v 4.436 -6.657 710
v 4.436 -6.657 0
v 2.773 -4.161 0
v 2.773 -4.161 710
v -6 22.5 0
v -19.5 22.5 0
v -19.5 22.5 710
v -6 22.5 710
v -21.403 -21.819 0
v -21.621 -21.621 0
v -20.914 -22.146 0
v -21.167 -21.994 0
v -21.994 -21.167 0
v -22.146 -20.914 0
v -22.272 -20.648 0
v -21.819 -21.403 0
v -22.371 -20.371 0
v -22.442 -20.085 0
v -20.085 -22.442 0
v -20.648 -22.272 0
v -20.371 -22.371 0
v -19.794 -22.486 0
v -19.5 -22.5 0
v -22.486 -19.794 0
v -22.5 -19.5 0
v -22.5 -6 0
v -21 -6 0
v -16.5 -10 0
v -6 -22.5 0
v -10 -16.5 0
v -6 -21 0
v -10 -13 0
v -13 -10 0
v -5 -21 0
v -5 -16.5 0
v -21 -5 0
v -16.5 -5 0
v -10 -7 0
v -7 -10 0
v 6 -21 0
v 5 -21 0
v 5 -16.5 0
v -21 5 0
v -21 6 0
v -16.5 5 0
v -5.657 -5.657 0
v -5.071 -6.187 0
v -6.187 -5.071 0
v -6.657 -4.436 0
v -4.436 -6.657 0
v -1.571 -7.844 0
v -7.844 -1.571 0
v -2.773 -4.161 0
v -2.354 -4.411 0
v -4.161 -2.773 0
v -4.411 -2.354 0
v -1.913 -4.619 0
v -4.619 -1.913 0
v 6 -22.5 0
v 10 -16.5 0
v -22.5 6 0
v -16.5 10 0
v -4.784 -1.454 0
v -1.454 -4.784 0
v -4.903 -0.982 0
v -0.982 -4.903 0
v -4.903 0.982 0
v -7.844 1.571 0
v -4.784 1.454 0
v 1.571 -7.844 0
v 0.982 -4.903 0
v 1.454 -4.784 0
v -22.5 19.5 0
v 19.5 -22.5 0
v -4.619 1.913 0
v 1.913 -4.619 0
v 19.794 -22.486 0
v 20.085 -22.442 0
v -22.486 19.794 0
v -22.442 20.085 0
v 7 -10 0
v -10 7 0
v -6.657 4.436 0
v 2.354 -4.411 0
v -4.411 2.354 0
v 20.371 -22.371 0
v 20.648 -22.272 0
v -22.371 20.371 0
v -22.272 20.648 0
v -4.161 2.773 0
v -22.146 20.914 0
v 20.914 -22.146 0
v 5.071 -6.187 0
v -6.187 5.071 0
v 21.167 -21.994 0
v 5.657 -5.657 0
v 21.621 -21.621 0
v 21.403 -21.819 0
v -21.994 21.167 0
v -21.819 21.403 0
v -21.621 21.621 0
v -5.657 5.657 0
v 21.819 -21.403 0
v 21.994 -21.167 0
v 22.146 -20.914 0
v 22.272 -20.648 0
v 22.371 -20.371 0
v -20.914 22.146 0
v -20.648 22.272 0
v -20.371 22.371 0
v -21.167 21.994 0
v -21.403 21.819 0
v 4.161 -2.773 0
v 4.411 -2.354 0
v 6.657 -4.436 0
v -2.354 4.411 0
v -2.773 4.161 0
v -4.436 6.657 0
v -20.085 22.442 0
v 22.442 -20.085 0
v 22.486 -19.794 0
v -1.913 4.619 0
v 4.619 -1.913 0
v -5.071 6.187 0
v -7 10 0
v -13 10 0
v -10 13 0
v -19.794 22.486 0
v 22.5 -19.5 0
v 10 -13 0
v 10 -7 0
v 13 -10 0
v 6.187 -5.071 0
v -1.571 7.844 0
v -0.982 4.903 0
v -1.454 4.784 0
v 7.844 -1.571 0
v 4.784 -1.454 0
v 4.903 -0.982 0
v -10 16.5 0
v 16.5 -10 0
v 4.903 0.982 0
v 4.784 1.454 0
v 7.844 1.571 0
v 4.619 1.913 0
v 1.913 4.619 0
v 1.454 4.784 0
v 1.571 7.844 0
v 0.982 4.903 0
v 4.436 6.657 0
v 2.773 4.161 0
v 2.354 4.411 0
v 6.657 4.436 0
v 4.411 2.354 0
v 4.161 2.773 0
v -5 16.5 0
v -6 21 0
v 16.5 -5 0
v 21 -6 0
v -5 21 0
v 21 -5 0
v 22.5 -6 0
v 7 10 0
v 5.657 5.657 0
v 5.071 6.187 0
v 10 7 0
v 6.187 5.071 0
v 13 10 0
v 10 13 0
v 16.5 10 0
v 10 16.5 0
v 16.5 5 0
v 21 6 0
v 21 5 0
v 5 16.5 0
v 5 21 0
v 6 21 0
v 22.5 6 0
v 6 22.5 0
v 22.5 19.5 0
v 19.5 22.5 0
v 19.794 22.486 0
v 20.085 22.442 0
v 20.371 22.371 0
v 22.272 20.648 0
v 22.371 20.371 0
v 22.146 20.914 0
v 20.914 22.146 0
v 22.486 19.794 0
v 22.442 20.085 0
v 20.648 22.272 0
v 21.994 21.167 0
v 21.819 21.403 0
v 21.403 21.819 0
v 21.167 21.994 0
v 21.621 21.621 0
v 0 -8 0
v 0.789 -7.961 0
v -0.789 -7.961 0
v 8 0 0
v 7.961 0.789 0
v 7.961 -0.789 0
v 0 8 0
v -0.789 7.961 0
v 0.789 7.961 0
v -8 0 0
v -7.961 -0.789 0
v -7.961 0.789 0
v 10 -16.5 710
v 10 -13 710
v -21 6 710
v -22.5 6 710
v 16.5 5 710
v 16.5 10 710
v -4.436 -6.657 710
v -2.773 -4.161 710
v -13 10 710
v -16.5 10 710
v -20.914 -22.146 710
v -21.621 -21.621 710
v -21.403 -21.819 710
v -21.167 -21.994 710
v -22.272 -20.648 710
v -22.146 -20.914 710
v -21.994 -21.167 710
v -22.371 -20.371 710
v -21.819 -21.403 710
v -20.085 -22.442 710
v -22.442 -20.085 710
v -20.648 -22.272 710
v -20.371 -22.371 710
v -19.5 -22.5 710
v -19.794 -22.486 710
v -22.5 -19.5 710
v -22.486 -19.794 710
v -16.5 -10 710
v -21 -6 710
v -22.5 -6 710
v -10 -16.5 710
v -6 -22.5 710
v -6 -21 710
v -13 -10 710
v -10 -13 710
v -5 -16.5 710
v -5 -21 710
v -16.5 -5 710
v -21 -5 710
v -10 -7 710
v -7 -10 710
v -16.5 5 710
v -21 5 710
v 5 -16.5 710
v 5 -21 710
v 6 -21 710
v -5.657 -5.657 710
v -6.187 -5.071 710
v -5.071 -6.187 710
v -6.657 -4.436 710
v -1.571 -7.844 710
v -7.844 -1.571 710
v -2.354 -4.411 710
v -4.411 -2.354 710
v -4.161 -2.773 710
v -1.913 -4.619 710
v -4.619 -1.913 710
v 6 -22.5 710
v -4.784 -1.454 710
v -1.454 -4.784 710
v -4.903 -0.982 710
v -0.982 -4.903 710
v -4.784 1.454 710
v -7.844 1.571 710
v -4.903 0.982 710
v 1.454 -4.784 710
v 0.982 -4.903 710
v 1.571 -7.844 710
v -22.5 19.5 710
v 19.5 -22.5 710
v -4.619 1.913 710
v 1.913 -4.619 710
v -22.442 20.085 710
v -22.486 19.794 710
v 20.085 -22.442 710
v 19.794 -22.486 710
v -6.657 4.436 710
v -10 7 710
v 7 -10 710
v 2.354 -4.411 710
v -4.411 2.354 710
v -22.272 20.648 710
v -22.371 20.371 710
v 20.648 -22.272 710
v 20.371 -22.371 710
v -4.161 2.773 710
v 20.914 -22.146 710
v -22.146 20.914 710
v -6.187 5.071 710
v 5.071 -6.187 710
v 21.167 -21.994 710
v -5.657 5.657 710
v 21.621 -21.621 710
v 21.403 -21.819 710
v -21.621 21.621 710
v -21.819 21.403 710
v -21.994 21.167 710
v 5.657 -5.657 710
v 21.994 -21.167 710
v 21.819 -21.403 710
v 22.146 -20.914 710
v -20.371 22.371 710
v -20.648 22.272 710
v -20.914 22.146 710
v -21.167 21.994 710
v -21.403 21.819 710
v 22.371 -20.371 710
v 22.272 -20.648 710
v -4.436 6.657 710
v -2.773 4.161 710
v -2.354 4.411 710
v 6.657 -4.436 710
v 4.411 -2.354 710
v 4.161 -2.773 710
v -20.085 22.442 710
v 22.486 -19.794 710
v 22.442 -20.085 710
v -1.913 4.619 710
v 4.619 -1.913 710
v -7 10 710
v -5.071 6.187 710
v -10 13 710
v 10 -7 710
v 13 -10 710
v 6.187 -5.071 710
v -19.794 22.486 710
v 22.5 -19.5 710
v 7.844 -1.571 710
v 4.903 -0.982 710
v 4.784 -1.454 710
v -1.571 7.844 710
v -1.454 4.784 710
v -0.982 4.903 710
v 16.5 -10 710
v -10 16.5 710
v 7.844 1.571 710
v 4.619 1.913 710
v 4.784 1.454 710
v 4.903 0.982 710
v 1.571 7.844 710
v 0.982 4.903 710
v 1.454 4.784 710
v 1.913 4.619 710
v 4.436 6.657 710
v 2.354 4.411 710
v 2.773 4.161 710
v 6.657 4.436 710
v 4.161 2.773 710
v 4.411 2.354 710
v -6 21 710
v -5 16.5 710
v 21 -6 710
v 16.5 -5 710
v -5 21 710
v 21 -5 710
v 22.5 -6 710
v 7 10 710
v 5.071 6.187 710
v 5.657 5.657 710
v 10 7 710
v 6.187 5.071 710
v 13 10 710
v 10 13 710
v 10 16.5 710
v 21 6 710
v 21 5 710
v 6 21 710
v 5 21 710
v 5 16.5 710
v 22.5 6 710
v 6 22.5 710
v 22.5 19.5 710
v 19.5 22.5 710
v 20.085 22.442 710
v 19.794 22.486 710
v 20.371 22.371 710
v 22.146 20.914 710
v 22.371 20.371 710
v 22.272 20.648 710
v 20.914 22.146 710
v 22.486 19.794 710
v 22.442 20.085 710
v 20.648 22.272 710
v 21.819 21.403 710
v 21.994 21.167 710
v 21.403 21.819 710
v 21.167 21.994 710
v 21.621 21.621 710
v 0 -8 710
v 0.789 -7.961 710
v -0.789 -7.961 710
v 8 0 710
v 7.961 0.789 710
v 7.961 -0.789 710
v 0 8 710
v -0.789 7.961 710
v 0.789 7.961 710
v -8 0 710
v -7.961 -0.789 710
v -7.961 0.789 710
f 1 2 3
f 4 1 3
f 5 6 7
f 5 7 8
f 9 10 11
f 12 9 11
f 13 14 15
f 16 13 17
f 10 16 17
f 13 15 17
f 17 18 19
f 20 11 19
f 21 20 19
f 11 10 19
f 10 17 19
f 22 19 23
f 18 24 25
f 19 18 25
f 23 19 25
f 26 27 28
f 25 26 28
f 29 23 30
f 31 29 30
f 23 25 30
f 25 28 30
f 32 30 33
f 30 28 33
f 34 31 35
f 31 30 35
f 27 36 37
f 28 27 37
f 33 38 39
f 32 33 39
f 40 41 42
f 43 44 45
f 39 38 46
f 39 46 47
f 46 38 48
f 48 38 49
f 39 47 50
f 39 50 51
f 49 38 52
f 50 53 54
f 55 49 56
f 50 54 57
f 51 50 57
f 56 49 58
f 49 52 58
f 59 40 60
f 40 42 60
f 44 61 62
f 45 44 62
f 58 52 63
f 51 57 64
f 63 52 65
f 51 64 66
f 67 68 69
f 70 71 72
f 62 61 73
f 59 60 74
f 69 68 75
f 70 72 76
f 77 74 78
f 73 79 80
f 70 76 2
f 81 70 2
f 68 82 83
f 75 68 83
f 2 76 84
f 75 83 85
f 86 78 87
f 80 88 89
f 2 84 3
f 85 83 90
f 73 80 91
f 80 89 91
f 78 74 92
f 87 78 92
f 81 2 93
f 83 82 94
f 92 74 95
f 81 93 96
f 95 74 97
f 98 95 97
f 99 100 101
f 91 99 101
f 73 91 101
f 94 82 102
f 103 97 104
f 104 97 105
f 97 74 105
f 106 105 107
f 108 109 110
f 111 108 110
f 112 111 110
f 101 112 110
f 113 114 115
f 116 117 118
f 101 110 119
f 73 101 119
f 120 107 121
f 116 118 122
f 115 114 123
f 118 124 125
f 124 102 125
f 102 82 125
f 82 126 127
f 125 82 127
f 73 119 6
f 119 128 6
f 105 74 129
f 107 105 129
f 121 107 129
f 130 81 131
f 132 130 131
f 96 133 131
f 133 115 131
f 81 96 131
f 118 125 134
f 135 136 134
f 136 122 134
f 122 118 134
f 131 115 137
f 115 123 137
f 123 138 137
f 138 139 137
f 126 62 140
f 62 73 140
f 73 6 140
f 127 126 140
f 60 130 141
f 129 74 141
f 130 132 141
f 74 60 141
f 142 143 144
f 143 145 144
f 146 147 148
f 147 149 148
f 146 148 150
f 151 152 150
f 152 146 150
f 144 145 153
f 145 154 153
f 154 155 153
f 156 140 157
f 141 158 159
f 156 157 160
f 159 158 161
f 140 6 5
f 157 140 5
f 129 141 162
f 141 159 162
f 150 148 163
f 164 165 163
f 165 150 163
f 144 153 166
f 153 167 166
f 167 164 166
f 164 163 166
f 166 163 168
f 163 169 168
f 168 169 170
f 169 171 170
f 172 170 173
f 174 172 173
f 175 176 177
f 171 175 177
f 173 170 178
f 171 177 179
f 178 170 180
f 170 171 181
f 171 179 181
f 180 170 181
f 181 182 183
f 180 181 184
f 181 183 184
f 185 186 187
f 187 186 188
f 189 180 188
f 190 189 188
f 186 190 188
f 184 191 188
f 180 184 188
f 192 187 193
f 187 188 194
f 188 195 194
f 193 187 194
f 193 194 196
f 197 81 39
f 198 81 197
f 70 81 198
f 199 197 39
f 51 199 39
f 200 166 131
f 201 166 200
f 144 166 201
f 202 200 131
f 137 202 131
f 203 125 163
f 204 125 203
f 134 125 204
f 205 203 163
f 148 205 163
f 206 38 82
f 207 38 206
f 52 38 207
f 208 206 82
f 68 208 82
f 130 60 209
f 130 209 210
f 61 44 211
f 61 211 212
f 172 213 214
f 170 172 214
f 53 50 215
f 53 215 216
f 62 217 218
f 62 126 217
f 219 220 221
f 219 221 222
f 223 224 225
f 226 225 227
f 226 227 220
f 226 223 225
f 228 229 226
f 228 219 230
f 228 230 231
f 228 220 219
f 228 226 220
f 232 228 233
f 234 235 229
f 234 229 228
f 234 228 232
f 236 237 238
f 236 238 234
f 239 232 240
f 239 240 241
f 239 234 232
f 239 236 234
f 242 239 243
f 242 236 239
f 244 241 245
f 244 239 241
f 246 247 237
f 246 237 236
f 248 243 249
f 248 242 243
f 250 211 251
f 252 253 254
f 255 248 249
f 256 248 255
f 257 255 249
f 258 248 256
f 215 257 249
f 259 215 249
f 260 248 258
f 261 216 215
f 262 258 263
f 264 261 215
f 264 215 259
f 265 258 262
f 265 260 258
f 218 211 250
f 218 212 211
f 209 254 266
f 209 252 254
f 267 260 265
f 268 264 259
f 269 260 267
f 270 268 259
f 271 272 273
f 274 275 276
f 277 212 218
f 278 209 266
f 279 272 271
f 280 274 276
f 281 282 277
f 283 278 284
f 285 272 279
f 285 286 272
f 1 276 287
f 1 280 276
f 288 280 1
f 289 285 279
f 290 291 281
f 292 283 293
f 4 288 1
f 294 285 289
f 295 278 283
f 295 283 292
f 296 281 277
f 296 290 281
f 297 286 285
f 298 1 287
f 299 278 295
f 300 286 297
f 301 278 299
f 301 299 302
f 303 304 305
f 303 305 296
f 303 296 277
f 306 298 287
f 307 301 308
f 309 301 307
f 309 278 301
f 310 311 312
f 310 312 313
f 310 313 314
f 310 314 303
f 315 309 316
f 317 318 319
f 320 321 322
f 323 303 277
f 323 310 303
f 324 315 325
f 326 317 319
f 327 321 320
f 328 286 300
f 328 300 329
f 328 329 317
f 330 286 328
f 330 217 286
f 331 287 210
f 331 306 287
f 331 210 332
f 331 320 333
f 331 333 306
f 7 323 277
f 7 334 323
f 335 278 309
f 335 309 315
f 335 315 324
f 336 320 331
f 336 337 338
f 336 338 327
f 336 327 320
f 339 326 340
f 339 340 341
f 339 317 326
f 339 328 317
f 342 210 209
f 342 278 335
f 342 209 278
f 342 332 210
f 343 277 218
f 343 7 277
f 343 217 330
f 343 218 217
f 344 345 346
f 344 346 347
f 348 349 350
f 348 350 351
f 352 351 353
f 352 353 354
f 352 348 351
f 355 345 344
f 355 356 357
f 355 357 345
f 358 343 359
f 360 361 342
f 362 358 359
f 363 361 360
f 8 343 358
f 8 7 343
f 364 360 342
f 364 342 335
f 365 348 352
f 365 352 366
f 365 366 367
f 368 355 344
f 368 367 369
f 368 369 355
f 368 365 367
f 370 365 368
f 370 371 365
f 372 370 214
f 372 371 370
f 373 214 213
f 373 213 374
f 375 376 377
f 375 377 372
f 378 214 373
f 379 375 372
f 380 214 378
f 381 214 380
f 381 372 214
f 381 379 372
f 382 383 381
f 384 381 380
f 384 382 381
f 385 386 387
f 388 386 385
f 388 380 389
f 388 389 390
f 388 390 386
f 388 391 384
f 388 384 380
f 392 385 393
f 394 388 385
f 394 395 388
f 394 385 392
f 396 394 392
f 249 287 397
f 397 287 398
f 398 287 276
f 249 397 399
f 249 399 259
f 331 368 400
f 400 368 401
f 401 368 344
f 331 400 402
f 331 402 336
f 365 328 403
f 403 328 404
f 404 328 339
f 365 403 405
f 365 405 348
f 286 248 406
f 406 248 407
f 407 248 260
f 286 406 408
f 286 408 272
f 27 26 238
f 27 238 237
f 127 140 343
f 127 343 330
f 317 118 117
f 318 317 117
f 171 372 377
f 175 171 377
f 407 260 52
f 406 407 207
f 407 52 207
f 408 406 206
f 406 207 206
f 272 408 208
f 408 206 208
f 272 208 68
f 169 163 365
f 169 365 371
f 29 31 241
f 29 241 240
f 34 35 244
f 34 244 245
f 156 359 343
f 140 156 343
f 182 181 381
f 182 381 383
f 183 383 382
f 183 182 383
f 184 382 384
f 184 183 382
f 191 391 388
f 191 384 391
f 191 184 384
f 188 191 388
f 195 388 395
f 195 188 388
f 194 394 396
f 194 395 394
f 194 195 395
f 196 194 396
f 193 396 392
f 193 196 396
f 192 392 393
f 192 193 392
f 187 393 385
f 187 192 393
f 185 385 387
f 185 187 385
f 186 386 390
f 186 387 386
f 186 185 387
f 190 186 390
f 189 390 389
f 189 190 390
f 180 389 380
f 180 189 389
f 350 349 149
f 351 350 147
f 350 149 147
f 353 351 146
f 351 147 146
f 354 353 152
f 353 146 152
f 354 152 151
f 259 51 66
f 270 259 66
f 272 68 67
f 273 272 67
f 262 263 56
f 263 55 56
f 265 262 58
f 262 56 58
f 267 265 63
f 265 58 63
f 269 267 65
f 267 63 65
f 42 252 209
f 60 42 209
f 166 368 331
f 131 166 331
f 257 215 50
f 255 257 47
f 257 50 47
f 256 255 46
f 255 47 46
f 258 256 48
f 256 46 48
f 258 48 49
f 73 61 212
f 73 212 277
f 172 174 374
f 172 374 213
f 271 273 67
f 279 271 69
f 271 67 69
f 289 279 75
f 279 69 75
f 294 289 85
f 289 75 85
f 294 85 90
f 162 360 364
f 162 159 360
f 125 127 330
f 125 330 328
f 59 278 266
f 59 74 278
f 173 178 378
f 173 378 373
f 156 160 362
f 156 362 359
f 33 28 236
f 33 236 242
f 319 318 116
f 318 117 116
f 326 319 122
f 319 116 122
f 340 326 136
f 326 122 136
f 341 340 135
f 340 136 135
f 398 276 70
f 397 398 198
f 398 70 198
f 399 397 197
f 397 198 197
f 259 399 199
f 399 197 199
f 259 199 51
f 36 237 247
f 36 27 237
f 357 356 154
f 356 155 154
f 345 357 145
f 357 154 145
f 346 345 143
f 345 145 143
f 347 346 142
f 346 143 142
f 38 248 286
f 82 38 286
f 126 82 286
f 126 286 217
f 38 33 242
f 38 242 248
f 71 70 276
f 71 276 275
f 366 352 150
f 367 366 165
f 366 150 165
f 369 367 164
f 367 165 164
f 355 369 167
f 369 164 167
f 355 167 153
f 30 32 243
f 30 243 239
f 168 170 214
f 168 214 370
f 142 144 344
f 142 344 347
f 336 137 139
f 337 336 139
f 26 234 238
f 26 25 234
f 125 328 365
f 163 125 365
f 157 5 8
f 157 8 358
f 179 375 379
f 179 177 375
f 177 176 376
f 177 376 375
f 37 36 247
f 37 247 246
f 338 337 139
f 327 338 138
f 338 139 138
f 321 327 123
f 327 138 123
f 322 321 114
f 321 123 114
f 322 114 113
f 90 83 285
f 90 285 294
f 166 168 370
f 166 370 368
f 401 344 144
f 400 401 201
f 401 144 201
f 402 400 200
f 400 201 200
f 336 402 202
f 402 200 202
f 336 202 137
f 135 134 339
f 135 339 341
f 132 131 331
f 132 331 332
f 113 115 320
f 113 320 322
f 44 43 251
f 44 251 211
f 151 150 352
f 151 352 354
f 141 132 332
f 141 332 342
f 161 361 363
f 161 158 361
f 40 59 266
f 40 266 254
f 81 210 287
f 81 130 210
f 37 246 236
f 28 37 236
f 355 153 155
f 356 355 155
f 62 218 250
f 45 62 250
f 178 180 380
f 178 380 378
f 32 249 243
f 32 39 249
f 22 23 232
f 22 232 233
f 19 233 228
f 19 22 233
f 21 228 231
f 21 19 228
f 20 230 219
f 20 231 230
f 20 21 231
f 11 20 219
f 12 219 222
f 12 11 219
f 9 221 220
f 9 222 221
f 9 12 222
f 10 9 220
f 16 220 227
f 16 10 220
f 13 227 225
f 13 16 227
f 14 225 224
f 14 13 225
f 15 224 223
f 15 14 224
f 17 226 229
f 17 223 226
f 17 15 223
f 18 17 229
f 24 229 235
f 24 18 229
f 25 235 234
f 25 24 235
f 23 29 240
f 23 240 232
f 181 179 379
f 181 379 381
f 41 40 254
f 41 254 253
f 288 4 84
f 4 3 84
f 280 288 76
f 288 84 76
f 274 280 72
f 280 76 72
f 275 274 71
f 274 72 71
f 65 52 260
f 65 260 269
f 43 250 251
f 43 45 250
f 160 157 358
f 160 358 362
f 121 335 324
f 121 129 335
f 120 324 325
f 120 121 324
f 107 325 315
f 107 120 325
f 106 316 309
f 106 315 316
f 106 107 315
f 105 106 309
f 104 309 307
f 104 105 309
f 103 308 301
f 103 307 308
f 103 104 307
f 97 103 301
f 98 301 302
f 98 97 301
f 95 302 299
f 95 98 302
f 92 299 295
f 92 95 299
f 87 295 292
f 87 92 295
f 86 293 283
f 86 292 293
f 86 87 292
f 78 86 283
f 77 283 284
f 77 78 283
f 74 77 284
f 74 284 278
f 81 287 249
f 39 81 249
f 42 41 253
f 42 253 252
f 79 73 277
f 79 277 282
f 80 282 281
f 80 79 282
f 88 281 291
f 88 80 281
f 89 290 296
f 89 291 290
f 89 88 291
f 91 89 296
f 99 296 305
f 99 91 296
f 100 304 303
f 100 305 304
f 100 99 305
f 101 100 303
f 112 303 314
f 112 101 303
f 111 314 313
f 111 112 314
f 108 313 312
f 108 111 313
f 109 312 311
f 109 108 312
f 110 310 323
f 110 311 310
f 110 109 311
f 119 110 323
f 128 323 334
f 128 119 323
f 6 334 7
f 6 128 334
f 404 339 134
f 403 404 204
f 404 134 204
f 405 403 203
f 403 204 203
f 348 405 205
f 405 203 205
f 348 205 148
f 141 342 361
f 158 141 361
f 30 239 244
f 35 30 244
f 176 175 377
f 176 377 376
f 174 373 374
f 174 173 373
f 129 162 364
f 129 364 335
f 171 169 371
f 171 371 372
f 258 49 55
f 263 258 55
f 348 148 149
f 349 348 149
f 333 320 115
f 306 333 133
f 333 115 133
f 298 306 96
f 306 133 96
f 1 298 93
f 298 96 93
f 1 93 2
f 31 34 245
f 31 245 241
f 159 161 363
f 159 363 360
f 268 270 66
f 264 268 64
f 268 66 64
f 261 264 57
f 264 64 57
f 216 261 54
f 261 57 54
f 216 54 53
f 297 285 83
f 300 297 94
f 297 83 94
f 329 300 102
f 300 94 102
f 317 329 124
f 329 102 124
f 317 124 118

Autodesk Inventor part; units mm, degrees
ref_plane "YZ Plane" through (0, 0, 0) normal (1, 0, 0) x (0, 1, 0)
ref_plane "XZ Plane" through (0, 0, 0) normal (0, 1, 0) x (-1, 0, 0)
ref_plane "XY Plane" through (0, 0, 0) normal (0, 0, 1) x (1, 0, 0)
sketch "Skizze1" plane through (0, 0, 0) normal (0, 0, 1) x (1, 0, 0)
  line L0 (-19.5, 22.5) -> (19.5, 22.5)
  line L1 (22.5, 19.5) -> (22.5, -19.5)
  line L2 (19.5, -22.5) -> (-19.5, -22.5)
  line L3 (-22.5, -19.5) -> (-22.5, 19.5)
  circle A0 centre (0, 0) radius 5
  line L4 (-32.3698, 0) -> (32.3698, 0) projected
  line L5 (0, -32.3698) -> (0, 32.3698) projected
  arc A1 (22.5, 19.5) -> (19.5, 22.5) centre (19.5, 19.5) ccw
  arc A2 (-19.5, 22.5) -> (-22.5, 19.5) centre (-19.5, 19.5) ccw
  arc A3 (-22.5, -19.5) -> (-19.5, -22.5) centre (-19.5, -19.5) ccw
  arc A4 (19.5, -22.5) -> (22.5, -19.5) centre (19.5, -19.5) ccw
  point P0 (-22.5, 22.5)
  point P1 (22.5, 22.5)
  point P2 (-22.5, -22.5)
  dimension "d0" = 45
  dimension "d1" = 45
  dimension "d2" = 10
  dimension "d3" = 3
extrude "Extrusion1" add sketch "Skizze1" along normal blind 710 contours L0 L5 A0 L4 L3 A2 | L0 A1 L1 L4 A0 L5 | L4 A0 L5 L2 A3 L3 | L4 L1 A4 L2 L5 A0
sketch "Skizze2" plane through (0, 0, 0) normal (0, 0, -1) x (-1, 0, 0)
  line L0 (19.5, -22.5) -> (-19.5, -22.5) projected
  line L1 (31.5, 0) -> (-31.5, 0) projected
  line L2 (0, -31.5) -> (0, 31.5) projected
  line L3 (-6, -22.5) -> (-6, -21)
  line L4 (-6, -21) -> (-5, -21)
  line L5 (-5, -21) -> (-5, -16.5)
  line L6 (-5, -16.5) -> (-10, -16.5)
  line L7 (-10, -16.5) -> (-10, -13)
  line L8 (-10, -13) -> (-7, -10)
  line L9 (-7, -10) -> (7, -10)
  line L10 (7, -10) -> (10, -13)
  line L11 (10, -13) -> (10, -16.5)
  line L12 (10, -16.5) -> (5, -16.5)
  line L13 (5, -16.5) -> (5, -21)
  line L14 (5, -21) -> (6, -21)
  line L15 (6, -21) -> (6, -22.5)
  dimension "d6" = 10
  dimension "d7" = 20
  dimension "d8" = 12
  dimension "d9" = 1.5
  dimension "d10" = 12.5
  dimension "d11" = 135
  dimension "d12" = 6
  dimension "d13" = 3.5
extrude "Extrusion2" cut sketch "Skizze2" against normal through all
pattern_circular "Runde Anordnung1" count 4 over 360 about axis through (0, 0, 0) along (0, 0, 1) of "Extrusion2"
sketch "Skizze3" plane through (0, 0, 0) normal (0, 0, -1) x (-1, 0, 0)
  circle A0 centre (0, 0) radius 5 projected
  line L0 (31.5, 0) -> (-31.5, 0) projected
  line L1 (0, -31.5) -> (0, 31.5) projected
  line L2 (-1.5708, 7.8443) -> (-0.9817, 4.9027)
  line L3 (1.5708, 7.8443) -> (0.9817, 4.9027)
  arc A1 (1.5708, 7.8443) -> (-1.5708, 7.8443) centre (0, 0) ccw
  dimension "d20" = 1.9635
  dimension "d21" = 3.1416
  dimension "d22" = 8
extrude "Extrusion3" cut sketch "Skizze3" against normal through all contours A0 L1 A1 L3 | A0 L2 A1 L1
pattern_circular "Runde Anordnung2" count 8 over 360 about axis through (0, 0, 0) along (0, 0, 1) of "Extrusion3"
properties part number "Alu-Profil Nut 10 45x45 710"
